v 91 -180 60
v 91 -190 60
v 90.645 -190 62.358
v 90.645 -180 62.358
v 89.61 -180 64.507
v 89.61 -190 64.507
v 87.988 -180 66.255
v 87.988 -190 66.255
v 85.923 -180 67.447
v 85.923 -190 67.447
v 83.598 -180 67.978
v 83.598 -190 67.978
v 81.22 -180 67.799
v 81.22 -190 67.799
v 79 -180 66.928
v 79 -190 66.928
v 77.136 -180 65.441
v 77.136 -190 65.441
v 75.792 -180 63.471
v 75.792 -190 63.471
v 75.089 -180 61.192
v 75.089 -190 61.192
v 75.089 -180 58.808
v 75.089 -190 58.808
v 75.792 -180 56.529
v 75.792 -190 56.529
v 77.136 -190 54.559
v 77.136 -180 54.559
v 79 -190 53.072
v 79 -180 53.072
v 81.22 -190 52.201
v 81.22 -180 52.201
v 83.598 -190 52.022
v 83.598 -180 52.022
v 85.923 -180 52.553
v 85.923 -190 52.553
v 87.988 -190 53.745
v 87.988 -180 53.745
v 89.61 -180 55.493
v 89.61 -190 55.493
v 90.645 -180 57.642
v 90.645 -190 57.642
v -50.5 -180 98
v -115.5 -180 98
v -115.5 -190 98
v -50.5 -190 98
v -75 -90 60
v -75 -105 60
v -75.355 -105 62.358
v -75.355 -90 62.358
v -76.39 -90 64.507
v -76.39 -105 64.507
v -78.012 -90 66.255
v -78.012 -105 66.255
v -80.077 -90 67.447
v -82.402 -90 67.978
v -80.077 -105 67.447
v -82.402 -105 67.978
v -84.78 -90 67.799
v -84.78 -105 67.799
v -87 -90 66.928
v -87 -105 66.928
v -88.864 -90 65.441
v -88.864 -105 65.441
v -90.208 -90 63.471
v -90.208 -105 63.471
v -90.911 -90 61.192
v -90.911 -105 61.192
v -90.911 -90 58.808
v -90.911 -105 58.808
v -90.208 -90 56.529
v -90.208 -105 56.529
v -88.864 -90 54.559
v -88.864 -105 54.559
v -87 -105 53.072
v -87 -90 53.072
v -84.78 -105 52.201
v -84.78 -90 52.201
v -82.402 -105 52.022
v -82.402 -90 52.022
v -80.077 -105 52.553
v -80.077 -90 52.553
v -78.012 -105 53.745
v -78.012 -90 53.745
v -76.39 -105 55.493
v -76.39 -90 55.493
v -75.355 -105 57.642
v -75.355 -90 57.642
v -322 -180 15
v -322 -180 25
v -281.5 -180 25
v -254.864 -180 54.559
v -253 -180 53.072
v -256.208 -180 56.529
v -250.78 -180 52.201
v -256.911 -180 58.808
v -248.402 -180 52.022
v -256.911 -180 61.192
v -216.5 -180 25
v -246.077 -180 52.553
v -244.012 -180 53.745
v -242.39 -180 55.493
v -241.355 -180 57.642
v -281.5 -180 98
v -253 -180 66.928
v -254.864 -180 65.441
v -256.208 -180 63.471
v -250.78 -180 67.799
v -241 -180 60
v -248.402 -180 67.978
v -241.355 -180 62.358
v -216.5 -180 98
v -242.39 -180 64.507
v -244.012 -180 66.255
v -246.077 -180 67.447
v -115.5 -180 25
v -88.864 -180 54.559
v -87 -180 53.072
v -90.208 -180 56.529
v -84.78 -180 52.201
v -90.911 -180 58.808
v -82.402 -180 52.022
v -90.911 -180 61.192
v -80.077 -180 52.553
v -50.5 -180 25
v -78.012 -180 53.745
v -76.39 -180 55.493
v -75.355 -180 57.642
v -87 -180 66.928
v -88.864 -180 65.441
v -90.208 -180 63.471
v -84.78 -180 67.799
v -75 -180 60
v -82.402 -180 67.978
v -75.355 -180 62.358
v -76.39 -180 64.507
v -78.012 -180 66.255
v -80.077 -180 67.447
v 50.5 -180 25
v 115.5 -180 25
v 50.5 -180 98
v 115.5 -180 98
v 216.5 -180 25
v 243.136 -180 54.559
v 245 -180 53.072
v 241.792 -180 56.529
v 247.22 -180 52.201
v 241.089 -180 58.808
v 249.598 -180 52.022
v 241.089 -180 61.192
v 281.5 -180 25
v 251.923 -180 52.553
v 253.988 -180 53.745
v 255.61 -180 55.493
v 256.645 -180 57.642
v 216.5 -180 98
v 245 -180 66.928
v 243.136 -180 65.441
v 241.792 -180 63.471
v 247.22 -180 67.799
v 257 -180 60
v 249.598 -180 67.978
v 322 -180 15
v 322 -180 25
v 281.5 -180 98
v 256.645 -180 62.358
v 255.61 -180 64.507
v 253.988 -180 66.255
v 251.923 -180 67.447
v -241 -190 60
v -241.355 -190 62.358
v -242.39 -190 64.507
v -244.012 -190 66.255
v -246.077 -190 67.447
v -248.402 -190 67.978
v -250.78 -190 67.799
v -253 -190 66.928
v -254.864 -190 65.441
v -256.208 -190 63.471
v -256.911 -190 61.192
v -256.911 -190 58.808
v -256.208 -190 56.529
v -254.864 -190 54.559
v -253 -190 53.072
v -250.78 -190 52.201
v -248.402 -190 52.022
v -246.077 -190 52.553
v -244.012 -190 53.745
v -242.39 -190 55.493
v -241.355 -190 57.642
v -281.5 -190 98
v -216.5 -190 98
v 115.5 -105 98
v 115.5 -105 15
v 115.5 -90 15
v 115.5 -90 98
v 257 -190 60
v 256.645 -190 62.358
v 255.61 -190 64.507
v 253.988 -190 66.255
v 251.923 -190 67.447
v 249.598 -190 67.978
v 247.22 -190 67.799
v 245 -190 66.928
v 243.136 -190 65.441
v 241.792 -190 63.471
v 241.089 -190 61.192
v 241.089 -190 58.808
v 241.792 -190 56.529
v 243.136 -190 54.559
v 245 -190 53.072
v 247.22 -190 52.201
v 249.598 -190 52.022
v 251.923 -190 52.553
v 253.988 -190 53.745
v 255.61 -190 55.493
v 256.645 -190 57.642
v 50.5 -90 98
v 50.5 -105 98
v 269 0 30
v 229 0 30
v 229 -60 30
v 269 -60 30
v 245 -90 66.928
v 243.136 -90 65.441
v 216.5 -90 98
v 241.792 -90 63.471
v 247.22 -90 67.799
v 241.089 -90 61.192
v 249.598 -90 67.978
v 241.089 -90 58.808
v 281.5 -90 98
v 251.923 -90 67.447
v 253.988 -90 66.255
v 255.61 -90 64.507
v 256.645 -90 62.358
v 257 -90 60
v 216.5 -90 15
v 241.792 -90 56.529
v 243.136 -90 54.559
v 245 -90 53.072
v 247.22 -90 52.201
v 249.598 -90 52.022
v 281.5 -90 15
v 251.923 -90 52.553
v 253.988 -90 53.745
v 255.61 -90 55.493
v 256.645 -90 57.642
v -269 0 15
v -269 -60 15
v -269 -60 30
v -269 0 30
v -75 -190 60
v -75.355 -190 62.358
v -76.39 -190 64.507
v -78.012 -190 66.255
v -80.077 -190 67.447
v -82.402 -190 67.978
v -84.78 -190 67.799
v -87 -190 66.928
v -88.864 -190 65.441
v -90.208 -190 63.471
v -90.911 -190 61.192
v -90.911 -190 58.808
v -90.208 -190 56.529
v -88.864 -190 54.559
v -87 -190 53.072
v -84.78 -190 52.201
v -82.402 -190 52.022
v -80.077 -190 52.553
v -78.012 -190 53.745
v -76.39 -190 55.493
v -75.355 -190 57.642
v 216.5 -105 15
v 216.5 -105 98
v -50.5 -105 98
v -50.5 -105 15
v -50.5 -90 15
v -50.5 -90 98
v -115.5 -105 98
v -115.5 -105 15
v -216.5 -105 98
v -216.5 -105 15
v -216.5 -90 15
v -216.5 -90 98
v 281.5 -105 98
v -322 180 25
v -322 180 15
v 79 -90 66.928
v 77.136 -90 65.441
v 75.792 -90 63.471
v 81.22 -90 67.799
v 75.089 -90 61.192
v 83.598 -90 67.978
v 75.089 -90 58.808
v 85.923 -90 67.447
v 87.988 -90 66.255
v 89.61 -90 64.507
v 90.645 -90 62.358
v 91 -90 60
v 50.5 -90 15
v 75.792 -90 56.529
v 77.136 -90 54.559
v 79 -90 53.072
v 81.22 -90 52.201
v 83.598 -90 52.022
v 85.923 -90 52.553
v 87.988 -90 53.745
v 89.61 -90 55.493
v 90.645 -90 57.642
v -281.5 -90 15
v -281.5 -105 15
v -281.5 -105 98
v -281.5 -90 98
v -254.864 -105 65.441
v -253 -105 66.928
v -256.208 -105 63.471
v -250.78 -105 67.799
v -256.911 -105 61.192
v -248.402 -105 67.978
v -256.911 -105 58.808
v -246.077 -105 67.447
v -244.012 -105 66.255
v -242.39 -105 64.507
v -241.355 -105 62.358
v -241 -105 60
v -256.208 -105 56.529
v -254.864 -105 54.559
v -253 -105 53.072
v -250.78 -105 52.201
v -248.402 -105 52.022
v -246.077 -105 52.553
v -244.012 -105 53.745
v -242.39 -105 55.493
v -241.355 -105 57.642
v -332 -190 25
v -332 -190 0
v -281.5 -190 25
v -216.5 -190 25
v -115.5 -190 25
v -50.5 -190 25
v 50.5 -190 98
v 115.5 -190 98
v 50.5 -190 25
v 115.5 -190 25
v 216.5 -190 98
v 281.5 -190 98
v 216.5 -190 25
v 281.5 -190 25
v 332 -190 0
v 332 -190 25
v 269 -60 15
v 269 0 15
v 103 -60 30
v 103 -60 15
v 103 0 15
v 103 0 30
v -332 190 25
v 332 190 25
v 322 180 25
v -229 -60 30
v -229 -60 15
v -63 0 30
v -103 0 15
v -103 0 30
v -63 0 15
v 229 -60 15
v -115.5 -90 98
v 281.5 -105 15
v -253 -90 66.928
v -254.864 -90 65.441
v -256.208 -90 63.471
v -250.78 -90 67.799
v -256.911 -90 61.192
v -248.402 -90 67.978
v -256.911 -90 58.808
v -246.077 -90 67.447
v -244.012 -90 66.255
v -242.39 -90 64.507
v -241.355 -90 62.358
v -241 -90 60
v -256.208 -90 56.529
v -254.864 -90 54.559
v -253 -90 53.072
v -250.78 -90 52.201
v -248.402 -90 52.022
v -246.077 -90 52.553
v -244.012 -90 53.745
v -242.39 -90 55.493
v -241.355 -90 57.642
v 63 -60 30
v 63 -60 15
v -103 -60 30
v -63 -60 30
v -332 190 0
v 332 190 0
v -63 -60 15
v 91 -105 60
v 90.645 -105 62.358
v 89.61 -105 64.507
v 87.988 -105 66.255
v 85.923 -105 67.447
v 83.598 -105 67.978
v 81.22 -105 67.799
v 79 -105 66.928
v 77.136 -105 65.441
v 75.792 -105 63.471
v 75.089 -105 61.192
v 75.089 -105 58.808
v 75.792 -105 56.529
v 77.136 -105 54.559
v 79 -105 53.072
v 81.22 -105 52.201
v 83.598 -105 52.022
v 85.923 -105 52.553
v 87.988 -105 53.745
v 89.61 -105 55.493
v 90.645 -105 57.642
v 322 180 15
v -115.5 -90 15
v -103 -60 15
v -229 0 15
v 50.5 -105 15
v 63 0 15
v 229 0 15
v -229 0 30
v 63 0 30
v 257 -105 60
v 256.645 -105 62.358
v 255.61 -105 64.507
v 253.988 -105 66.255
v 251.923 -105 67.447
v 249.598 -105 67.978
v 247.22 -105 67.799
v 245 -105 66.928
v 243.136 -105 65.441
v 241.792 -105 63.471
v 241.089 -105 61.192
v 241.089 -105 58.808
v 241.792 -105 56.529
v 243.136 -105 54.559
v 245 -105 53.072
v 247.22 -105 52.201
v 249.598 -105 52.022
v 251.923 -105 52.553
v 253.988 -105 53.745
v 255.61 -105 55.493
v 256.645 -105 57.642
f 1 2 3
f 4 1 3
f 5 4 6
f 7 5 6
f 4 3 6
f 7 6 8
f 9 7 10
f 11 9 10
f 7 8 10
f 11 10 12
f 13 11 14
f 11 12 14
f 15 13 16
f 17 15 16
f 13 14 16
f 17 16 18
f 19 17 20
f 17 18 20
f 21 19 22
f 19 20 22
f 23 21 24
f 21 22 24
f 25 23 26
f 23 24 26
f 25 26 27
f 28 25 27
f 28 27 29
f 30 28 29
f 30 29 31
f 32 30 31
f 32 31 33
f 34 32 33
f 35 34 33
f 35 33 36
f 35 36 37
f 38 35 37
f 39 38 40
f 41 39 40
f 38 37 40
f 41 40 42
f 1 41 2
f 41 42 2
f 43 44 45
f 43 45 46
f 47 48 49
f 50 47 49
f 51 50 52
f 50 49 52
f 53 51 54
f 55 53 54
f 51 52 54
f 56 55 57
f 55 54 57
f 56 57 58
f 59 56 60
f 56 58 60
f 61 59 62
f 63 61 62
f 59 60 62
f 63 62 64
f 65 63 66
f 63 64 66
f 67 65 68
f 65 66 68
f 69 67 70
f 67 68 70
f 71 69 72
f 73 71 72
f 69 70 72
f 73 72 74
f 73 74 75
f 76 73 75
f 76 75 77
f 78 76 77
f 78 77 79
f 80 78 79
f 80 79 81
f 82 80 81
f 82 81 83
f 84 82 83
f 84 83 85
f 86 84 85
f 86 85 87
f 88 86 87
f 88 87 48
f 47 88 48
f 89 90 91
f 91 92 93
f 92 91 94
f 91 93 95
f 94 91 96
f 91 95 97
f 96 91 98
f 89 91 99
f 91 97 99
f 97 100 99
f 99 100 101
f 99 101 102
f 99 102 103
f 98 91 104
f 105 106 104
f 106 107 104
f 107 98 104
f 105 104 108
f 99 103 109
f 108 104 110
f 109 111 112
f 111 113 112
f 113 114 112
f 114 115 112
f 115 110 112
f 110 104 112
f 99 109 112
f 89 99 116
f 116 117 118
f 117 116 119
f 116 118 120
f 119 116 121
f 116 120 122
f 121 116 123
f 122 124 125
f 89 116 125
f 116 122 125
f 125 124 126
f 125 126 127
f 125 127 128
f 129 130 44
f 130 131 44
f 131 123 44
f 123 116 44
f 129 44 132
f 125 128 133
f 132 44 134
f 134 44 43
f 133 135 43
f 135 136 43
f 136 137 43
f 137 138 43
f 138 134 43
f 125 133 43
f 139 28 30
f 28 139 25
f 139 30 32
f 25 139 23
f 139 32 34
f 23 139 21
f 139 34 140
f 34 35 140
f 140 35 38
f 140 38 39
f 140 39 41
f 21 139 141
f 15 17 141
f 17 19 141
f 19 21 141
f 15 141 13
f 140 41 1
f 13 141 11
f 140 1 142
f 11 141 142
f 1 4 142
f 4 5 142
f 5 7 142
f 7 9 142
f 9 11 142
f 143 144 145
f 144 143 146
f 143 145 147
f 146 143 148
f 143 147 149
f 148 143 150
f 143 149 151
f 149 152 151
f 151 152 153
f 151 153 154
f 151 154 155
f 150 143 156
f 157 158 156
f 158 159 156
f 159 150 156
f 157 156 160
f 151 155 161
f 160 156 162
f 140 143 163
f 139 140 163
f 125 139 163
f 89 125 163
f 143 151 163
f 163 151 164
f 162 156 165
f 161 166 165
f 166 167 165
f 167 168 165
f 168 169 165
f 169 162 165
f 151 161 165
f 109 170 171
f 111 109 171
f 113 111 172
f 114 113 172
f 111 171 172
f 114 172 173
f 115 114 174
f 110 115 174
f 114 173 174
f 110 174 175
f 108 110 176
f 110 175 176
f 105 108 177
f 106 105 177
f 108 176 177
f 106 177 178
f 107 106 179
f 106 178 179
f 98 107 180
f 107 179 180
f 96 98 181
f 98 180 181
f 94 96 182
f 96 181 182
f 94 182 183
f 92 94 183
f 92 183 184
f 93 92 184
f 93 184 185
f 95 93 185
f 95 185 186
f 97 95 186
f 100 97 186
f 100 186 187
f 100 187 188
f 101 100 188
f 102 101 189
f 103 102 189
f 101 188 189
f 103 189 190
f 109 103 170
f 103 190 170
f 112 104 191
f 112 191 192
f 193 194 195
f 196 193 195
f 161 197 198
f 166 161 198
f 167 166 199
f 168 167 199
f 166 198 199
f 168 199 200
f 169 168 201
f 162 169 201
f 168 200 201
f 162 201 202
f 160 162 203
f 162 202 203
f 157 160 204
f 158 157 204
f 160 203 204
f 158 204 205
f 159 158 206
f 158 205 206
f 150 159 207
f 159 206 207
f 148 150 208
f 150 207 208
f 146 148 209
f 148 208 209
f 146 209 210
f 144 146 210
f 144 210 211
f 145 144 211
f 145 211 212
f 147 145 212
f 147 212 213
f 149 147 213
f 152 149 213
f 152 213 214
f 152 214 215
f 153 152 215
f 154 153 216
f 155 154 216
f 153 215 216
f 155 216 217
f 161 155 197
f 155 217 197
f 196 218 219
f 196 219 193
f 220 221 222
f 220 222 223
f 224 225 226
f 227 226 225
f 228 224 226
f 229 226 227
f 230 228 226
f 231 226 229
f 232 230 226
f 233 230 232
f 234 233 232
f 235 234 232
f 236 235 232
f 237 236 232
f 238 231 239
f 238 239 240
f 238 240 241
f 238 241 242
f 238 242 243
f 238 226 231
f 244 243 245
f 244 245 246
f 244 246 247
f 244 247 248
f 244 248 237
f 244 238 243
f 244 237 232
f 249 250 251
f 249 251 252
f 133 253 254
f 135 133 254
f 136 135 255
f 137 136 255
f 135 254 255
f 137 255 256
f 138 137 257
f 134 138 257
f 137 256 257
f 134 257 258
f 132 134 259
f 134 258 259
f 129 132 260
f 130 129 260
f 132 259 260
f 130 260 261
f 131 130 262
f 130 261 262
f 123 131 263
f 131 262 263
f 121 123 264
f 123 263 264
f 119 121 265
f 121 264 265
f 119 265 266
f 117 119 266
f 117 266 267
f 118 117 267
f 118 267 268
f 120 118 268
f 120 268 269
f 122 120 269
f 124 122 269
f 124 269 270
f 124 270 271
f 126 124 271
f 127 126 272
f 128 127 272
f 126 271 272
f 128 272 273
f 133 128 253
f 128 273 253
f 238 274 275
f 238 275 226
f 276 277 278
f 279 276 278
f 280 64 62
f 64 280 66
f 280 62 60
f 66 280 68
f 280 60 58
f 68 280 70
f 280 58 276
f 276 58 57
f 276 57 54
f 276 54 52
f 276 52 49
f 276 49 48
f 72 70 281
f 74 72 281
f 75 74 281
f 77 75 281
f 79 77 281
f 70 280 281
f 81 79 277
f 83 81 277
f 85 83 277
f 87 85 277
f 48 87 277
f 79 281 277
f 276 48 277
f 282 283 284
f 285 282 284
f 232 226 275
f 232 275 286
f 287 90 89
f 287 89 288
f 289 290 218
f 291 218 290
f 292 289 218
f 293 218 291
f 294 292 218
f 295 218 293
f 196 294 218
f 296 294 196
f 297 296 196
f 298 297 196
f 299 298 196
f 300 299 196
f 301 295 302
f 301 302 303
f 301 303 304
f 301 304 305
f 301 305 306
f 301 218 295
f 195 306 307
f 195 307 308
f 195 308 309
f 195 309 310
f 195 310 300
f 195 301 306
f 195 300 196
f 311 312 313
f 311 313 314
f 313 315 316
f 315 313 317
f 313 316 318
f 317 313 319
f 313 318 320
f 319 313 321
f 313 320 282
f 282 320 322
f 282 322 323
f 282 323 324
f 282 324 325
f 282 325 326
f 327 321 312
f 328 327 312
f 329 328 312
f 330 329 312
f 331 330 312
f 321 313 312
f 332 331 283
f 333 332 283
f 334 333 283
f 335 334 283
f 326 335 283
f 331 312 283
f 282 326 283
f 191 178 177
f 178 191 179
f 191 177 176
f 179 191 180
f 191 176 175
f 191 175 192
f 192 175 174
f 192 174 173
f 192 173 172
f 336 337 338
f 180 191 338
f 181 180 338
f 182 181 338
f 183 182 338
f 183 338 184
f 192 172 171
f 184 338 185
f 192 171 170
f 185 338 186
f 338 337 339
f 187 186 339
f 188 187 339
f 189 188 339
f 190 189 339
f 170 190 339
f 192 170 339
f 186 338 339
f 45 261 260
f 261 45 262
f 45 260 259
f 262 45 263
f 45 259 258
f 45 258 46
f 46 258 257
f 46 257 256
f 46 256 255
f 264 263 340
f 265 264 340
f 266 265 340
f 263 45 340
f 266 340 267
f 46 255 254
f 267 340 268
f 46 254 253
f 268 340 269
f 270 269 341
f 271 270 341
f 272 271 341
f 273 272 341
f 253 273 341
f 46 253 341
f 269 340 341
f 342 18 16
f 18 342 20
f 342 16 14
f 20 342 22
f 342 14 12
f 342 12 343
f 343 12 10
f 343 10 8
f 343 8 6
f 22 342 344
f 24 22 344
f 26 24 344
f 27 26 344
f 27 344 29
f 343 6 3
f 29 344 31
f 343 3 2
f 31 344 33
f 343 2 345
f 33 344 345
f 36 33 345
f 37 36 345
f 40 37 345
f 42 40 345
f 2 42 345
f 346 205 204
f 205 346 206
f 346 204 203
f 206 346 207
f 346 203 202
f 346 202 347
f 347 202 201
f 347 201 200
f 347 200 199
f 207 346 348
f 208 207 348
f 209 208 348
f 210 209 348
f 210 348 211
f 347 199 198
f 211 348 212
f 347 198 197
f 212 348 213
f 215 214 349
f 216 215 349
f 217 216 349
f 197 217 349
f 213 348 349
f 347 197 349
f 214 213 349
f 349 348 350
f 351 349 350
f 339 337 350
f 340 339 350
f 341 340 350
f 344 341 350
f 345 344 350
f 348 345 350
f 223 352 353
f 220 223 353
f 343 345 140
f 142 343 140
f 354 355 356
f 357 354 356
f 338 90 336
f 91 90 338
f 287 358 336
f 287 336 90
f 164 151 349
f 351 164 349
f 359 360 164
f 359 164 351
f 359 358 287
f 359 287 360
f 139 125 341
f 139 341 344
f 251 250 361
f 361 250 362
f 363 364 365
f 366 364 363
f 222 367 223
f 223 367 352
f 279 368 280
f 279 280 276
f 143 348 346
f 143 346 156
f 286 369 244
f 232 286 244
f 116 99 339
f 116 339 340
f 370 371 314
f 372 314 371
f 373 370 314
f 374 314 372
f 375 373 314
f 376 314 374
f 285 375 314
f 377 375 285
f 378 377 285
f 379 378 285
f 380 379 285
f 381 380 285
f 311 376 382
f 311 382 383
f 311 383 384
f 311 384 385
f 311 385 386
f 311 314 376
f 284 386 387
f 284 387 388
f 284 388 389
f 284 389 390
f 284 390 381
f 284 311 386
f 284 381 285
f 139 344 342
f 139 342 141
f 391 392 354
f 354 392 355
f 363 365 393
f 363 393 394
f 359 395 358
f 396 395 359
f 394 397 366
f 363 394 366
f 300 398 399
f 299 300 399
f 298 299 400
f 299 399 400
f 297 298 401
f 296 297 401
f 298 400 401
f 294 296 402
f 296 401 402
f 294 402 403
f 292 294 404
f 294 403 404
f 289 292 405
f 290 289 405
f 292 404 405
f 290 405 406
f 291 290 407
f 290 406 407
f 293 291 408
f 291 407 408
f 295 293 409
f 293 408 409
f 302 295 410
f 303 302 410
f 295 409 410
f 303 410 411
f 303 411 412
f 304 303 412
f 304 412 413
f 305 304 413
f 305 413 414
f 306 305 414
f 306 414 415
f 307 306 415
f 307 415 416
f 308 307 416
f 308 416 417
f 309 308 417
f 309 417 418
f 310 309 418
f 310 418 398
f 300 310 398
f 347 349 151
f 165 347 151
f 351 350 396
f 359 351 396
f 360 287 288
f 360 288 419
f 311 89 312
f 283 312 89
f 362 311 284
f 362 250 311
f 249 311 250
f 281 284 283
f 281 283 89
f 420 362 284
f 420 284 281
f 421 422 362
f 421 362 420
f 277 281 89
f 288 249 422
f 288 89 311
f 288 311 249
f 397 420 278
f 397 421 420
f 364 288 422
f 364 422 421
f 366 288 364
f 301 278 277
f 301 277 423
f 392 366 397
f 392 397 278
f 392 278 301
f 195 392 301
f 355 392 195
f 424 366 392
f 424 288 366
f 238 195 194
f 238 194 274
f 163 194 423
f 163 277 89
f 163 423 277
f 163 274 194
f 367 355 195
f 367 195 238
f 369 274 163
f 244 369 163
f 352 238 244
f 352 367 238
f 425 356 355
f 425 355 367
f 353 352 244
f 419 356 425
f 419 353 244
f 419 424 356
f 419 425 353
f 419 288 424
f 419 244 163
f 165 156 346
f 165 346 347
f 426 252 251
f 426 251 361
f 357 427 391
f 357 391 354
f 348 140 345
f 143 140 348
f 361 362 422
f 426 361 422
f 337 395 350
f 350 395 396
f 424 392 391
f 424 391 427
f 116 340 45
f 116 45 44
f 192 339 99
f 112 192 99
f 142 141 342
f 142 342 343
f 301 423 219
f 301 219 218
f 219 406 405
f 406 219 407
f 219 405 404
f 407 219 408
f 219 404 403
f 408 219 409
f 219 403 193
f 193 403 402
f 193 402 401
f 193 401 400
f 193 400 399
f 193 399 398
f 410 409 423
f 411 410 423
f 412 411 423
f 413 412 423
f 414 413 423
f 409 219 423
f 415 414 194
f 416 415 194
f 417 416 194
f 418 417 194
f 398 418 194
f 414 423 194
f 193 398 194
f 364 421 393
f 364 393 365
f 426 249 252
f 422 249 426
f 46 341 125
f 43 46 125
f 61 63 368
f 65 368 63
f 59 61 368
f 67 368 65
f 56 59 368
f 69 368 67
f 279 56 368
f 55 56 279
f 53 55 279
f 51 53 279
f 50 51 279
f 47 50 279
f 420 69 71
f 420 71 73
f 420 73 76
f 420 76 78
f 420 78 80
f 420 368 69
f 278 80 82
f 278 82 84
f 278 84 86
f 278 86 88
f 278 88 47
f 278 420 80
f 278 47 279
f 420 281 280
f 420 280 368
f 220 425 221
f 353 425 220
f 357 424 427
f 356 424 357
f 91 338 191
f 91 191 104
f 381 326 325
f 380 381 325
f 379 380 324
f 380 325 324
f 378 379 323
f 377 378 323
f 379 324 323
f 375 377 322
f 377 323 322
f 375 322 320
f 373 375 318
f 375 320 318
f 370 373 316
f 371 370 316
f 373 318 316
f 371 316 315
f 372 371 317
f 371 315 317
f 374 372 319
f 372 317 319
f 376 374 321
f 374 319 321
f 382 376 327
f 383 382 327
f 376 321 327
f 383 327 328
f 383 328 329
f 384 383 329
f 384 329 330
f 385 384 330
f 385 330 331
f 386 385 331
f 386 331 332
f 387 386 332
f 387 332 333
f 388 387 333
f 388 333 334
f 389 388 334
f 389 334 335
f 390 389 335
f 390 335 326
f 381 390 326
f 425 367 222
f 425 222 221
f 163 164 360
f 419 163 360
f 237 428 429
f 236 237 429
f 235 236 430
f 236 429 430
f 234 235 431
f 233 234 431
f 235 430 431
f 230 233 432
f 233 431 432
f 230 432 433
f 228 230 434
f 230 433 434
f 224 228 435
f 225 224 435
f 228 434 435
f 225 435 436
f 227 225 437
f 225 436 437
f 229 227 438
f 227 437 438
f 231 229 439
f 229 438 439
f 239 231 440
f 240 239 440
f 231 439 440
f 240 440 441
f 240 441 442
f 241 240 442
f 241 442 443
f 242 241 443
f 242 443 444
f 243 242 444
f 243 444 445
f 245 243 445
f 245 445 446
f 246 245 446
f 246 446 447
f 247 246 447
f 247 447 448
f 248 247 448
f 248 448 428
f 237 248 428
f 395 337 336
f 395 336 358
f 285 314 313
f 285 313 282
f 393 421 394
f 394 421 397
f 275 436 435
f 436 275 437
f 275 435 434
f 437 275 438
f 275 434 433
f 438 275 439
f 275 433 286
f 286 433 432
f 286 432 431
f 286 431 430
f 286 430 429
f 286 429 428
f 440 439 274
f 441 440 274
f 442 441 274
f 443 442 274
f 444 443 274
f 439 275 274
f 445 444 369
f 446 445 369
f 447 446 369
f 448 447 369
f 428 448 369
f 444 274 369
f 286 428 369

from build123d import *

# Parameters (mm, degrees)
SKETCH_W        = 664
SKETCH_H        = 380
PAD_DEPTH       = 25
SKETCH001_W     = 644
SKETCH001_H     = 360
POCKET_DEPTH    = 10
SKETCH002_W     = 65
SKETCH002_H     = 10
PAD001_DEPTH    = 73
SKETCH003_R     = 8
POCKET001_DEPTH = 10
SKETCH004_W     = 65
SKETCH004_H     = 15
PAD002_DEPTH    = 83
SKETCH005_R     = 8
POCKET002_DEPTH = 100
SKETCH006_W     = 40
SKETCH006_H     = 60
PAD003_DEPTH    = 15


with BuildPart() as part:
    # Sketch → Pad (new body)
    with BuildSketch(Plane.XY):
        Rectangle(SKETCH_W, SKETCH_H)
    extrude(amount=PAD_DEPTH)

    # Sketch001 (on Face6 of Pad) → Pocket (cut)
    with BuildSketch(Plane.XY.offset(25)):
        Rectangle(SKETCH001_W, SKETCH001_H)
    extrude(amount=-POCKET_DEPTH, mode=Mode.SUBTRACT)

    # Sketch002 (on Face5 of Pocket) → Pad001 (join)
    with BuildSketch(Plane.XY.offset(25)):
        with Locations((-249, -185)):
            Rectangle(SKETCH002_W, SKETCH002_H)
        with Locations((-83, -185)):
            Rectangle(SKETCH002_W, SKETCH002_H)
        with Locations((83, -185)):
            Rectangle(SKETCH002_W, SKETCH002_H)
        with Locations((249, -185)):
            Rectangle(SKETCH002_W, SKETCH002_H)
    extrude(amount=PAD001_DEPTH)

    # Sketch003 (on Face25 of Pad001) → Pocket001 (cut)
    with BuildSketch(Plane.XZ.offset(190)):
        with Locations((249, 60)):
            Circle(SKETCH003_R)
        with Locations((83, 60)):
            Circle(SKETCH003_R)
        with Locations((-83, 60)):
            Circle(SKETCH003_R)
        with Locations((-249, 60)):
            Circle(SKETCH003_R)
    extrude(amount=-POCKET001_DEPTH, mode=Mode.SUBTRACT)

    # Sketch004 (on Face27 of Pocket001) → Pad002 (join)
    with BuildSketch(Plane.XY.offset(15)):
        with Locations((249, -97.5)):
            Rectangle(SKETCH004_W, SKETCH004_H)
        with Locations((83, -97.5)):
            Rectangle(SKETCH004_W, SKETCH004_H)
        with Locations((-249, -97.5)):
            Rectangle(SKETCH004_W, SKETCH004_H)
        with Locations((-83, -97.5)):
            Rectangle(SKETCH004_W, SKETCH004_H)
    extrude(amount=PAD002_DEPTH)

    # Sketch005 → Pocket002 (cut)
    with BuildSketch(Plane.XZ.offset(190)):
        with Locations((-249, 60)):
            Circle(SKETCH005_R)
        with Locations((-83, 60)):
            Circle(SKETCH005_R)
        with Locations((83, 60)):
            Circle(SKETCH005_R)
        with Locations((249, 60)):
            Circle(SKETCH005_R)
    extrude(amount=-POCKET002_DEPTH, mode=Mode.SUBTRACT)

    # Sketch006 (on Face27 of Pocket002) → Pad003 (join)
    with BuildSketch(Plane.XY.offset(15)):
        with Locations((-249, -30)):
            Rectangle(SKETCH006_W, SKETCH006_H)
        with Locations((-83, -30)):
            Rectangle(SKETCH006_W, SKETCH006_H)
        with Locations((83, -30)):
            Rectangle(SKETCH006_W, SKETCH006_H)
        with Locations((249, -30)):
            Rectangle(SKETCH006_W, SKETCH006_H)
    extrude(amount=PAD003_DEPTH)


solid = part.part
